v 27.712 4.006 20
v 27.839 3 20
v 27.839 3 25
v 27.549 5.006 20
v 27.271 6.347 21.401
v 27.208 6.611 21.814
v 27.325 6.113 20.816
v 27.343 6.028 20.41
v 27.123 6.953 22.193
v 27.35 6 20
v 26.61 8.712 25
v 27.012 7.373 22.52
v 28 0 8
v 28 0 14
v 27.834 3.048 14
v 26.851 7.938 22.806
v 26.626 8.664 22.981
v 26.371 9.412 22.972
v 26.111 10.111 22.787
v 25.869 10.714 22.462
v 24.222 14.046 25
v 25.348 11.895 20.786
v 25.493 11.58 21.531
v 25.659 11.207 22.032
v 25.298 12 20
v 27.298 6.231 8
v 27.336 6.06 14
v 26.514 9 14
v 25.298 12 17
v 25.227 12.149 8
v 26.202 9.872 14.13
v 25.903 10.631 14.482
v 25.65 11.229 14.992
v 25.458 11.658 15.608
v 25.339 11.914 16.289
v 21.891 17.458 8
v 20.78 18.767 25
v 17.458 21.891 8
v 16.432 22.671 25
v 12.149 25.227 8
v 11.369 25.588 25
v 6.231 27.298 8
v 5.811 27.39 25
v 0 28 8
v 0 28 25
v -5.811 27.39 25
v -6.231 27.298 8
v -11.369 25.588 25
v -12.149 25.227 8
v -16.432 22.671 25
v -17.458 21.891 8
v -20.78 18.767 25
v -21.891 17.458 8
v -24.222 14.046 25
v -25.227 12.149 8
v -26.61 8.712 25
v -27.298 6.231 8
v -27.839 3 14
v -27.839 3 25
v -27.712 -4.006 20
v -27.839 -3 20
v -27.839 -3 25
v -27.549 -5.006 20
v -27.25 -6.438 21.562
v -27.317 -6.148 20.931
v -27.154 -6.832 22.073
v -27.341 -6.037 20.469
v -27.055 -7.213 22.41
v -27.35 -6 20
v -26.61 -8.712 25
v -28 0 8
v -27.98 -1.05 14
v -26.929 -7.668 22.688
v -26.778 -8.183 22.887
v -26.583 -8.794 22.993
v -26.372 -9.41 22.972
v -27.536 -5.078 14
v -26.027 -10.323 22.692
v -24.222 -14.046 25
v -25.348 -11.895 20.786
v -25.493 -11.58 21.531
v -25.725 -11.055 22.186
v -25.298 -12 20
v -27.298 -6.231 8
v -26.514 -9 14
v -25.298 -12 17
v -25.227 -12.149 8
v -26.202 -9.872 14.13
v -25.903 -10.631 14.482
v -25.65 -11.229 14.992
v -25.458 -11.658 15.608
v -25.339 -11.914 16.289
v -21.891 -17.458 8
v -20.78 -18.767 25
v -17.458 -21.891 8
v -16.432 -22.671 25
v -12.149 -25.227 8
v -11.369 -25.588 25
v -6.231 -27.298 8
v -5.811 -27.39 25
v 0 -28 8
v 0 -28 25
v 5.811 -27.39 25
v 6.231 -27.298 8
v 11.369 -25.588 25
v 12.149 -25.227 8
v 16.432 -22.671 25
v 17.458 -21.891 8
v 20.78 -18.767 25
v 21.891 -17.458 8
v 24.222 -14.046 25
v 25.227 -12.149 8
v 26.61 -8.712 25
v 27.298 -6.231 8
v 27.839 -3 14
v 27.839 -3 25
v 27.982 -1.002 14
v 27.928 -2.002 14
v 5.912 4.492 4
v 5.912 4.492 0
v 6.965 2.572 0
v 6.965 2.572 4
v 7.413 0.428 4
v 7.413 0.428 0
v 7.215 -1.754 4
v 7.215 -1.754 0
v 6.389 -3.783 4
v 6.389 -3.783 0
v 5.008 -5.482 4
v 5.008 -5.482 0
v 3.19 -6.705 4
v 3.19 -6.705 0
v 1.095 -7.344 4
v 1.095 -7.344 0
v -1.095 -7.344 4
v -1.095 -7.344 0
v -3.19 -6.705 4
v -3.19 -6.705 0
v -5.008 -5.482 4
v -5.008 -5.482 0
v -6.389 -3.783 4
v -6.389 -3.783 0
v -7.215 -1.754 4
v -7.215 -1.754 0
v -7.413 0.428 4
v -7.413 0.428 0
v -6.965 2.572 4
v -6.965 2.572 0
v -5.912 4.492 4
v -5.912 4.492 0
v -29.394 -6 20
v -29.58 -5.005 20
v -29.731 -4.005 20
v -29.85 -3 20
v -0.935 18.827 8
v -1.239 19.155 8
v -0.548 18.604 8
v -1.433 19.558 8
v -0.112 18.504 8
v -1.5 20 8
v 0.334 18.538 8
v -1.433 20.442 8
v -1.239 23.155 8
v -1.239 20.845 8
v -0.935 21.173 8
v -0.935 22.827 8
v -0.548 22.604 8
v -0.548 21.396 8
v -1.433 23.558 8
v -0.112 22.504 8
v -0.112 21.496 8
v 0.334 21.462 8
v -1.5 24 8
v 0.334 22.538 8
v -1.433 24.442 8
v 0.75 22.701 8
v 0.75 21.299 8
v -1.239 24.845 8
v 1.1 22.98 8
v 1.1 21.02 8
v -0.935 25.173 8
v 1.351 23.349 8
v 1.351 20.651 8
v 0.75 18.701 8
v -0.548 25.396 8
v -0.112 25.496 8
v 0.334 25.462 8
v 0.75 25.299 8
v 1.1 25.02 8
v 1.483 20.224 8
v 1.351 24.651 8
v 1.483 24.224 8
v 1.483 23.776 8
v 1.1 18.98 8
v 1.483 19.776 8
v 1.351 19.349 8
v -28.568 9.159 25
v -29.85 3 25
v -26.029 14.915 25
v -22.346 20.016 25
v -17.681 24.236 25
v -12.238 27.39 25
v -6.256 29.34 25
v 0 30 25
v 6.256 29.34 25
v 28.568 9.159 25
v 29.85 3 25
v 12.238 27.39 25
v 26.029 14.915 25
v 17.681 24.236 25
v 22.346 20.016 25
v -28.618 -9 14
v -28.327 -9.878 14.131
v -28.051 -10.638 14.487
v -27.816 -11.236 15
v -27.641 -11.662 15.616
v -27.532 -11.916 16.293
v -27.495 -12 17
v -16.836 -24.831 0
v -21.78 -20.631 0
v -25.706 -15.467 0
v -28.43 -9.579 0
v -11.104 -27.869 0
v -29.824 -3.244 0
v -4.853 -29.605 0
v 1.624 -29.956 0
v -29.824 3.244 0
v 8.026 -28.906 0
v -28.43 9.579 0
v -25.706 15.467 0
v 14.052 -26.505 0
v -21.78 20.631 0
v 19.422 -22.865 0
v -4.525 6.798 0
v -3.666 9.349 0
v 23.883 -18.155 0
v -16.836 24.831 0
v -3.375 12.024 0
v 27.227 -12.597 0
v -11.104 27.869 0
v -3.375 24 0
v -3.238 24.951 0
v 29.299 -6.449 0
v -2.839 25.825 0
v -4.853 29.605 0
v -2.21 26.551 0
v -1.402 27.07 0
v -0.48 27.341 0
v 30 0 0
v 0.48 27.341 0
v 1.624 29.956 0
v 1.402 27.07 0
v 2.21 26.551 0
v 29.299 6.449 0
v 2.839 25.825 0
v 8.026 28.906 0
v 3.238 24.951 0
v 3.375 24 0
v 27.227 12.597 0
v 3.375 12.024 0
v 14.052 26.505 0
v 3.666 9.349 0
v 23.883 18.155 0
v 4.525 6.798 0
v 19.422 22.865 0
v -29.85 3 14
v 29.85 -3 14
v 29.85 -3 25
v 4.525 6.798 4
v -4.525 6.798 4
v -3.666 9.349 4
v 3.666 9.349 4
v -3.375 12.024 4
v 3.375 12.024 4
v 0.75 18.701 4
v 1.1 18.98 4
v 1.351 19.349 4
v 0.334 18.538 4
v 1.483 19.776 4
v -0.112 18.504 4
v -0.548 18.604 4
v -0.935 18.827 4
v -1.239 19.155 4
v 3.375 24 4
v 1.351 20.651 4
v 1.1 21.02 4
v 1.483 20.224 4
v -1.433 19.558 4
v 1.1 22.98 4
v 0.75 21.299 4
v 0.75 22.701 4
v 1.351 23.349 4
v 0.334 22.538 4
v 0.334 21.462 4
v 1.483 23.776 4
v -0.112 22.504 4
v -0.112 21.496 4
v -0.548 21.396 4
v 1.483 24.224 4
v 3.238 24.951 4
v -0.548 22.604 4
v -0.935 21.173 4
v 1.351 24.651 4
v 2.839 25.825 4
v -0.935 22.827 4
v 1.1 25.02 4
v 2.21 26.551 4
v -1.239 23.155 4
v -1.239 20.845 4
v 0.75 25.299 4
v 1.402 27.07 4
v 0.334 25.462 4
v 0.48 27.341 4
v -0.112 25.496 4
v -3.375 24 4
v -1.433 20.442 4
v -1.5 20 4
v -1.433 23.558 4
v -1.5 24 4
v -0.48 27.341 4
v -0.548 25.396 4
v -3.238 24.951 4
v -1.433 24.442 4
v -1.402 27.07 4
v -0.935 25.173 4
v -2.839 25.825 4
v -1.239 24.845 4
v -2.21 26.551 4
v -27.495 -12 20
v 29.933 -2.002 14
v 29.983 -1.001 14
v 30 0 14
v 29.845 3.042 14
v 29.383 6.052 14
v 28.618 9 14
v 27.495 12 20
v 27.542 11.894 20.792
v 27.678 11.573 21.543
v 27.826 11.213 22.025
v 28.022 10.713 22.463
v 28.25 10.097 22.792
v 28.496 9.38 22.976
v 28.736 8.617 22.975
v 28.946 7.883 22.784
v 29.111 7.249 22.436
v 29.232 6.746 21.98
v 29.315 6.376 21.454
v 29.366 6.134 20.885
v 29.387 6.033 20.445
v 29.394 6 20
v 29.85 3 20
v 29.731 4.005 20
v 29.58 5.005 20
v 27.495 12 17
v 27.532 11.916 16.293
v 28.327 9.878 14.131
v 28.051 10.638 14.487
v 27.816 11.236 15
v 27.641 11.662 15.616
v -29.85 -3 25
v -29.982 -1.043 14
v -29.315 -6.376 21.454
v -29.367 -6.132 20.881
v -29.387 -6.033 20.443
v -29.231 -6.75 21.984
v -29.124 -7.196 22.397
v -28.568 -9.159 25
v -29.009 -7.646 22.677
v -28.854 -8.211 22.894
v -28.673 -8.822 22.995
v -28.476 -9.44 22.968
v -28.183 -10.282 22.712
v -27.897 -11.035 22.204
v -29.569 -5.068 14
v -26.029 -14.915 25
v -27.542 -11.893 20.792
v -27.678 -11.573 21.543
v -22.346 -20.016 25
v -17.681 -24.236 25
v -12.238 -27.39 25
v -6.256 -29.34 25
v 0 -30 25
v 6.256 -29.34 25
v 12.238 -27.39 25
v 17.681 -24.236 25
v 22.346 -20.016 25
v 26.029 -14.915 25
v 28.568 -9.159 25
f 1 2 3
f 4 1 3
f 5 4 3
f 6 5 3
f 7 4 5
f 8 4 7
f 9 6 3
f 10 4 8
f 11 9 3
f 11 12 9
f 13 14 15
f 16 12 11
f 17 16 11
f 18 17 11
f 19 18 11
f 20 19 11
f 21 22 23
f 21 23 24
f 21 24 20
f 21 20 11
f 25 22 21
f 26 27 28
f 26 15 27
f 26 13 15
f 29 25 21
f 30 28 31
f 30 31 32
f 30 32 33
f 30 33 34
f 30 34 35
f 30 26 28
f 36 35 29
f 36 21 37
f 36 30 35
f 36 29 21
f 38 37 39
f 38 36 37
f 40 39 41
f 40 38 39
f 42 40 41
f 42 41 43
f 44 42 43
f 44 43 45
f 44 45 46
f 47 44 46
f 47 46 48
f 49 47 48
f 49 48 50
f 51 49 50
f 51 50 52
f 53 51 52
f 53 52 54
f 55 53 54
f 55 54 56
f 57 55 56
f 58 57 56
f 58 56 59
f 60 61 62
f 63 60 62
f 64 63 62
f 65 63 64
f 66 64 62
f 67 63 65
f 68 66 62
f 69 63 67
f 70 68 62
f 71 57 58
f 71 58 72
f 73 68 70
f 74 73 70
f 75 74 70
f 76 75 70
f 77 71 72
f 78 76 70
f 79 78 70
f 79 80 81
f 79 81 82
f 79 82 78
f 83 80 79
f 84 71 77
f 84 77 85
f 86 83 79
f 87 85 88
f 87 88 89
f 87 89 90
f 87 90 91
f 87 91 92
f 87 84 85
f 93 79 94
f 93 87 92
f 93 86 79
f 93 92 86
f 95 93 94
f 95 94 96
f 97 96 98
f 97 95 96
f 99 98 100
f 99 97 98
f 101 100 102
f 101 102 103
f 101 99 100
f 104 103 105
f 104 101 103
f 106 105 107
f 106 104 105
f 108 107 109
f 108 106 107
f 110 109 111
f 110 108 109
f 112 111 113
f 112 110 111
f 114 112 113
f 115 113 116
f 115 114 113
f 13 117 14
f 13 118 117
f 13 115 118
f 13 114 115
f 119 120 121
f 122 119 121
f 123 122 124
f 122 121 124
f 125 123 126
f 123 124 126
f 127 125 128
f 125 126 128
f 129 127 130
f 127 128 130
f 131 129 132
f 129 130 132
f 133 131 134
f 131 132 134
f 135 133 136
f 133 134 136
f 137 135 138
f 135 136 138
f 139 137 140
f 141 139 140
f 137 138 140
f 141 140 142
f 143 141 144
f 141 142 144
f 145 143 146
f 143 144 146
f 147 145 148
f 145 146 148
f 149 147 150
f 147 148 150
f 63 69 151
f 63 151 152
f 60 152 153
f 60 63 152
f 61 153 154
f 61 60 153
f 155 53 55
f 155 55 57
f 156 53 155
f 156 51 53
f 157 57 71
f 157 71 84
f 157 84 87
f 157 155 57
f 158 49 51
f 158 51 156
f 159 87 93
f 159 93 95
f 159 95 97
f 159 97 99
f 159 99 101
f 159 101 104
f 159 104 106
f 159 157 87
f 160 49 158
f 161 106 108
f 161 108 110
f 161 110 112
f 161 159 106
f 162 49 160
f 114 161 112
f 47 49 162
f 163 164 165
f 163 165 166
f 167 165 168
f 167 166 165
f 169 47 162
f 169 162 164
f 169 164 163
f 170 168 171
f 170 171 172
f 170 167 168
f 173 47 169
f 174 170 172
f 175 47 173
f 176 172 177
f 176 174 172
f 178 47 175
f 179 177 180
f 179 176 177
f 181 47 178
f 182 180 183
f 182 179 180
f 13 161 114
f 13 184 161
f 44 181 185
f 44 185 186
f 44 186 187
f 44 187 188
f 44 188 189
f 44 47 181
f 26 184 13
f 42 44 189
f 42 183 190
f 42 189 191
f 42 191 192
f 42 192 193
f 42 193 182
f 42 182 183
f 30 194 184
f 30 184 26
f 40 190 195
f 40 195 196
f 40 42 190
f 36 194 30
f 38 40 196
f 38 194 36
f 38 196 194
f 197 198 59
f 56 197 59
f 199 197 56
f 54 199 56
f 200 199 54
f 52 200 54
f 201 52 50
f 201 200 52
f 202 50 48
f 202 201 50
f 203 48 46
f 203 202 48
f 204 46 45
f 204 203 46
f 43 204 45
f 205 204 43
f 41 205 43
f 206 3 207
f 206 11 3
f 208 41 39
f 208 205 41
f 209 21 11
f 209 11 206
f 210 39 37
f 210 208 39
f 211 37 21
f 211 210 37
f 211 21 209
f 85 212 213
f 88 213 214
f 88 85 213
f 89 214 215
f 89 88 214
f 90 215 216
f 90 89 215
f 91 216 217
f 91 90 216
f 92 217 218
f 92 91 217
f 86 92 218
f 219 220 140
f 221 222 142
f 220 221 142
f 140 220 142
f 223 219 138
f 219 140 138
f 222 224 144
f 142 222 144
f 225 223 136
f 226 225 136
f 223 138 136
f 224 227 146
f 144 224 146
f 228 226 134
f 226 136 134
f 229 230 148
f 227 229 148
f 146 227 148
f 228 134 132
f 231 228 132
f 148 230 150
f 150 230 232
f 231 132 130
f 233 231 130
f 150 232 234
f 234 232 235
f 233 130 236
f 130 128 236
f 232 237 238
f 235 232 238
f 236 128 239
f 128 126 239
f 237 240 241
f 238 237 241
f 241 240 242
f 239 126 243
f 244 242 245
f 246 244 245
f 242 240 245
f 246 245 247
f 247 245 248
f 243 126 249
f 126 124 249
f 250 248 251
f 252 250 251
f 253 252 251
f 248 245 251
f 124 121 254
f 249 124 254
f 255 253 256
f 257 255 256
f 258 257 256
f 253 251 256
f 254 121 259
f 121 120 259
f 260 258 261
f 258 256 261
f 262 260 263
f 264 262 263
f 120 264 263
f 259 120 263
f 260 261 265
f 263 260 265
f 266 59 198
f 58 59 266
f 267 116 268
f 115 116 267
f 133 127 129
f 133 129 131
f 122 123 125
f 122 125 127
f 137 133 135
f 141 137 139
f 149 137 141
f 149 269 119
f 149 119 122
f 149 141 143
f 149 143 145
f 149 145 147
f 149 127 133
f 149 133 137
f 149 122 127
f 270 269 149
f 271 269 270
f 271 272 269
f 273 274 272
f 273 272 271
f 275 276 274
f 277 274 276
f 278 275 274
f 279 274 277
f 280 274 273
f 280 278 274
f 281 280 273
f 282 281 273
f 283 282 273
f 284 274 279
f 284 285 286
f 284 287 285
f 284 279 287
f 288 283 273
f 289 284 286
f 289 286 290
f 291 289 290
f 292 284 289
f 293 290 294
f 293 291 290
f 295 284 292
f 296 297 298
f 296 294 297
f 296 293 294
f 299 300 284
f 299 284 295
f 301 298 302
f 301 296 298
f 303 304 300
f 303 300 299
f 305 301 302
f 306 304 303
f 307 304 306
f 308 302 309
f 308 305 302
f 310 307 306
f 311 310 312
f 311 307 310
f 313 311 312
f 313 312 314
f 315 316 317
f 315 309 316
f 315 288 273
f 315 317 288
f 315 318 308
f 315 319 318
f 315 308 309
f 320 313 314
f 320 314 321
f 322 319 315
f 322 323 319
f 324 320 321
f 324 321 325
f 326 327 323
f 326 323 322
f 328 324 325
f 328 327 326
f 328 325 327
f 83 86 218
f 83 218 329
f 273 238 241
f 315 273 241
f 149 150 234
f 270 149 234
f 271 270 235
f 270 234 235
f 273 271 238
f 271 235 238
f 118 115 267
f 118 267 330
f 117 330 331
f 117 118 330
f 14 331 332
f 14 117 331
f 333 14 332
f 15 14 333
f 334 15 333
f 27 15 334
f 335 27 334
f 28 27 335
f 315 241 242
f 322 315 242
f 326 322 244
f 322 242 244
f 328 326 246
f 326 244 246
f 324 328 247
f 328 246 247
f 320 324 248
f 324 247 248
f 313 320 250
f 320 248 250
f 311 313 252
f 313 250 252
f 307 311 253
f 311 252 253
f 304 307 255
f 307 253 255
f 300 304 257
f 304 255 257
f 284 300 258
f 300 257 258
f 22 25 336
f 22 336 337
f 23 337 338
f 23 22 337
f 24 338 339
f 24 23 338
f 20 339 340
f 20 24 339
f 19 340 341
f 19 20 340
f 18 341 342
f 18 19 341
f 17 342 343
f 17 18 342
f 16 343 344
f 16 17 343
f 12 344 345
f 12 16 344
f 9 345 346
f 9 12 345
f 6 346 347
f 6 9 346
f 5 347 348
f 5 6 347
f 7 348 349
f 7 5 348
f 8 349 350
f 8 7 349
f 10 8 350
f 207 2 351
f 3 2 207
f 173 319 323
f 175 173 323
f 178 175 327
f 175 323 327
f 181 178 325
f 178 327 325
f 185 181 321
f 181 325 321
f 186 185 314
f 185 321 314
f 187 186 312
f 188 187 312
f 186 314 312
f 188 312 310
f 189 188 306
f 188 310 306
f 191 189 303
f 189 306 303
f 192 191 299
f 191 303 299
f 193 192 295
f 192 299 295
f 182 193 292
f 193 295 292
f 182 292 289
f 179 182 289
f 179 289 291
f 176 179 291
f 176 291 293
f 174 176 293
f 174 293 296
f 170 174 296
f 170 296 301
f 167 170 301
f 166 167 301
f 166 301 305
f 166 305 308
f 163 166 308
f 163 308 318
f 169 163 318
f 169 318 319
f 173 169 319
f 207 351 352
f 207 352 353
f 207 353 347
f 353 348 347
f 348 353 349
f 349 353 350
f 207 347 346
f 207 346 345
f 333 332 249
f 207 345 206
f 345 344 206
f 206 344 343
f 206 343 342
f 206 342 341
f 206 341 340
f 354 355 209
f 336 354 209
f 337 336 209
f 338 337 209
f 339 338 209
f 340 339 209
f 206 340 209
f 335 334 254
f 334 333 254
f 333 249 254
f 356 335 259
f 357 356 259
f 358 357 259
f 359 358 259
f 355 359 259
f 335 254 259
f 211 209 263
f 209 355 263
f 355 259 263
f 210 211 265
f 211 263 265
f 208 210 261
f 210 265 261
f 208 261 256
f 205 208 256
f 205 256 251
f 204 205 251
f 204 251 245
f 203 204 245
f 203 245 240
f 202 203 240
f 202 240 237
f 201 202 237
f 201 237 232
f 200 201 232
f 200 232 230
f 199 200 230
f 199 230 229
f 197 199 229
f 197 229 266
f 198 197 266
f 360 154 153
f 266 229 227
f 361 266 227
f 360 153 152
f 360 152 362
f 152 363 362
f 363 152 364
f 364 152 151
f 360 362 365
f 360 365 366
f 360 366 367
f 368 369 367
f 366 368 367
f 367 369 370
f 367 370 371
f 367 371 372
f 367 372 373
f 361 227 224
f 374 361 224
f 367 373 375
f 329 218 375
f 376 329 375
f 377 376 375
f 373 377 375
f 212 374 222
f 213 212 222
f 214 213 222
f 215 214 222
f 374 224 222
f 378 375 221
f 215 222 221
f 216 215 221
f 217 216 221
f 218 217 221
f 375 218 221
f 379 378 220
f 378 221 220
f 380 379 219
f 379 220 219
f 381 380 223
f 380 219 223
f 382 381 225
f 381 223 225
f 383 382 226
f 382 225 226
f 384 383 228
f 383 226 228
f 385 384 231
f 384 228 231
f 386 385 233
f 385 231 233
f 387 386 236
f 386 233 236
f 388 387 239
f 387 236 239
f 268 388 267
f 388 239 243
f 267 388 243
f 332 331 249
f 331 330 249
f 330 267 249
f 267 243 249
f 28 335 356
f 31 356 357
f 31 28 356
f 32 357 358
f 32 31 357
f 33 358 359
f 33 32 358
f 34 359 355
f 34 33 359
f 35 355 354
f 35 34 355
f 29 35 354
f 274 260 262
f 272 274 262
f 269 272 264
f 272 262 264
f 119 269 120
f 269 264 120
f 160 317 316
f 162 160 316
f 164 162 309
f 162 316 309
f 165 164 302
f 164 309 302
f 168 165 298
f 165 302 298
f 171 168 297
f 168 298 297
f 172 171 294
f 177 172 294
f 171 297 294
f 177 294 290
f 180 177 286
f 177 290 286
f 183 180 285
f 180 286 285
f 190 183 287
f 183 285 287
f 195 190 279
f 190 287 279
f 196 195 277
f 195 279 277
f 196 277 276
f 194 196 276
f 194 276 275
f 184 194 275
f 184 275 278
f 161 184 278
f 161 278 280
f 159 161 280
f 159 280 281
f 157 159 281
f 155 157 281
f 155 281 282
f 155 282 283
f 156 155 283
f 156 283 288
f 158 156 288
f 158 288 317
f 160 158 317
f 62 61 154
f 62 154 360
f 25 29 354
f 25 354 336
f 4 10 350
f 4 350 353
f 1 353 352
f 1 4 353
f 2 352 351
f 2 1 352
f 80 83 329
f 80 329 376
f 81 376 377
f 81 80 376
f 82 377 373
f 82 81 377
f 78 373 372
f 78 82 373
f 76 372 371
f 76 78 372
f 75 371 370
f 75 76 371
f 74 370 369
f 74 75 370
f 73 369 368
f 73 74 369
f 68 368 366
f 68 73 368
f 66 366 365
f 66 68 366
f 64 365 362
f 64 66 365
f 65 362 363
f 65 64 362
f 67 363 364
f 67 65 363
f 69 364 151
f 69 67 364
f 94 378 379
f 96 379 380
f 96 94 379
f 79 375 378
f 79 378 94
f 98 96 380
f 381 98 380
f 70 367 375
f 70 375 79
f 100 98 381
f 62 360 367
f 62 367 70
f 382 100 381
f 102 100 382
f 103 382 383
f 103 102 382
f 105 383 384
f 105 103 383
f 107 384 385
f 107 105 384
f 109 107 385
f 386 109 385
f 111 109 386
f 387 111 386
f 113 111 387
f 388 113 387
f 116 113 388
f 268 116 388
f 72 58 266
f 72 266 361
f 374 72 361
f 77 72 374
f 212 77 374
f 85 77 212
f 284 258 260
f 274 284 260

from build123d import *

# Parameters (mm, degrees)
SKETCH1_R           = 30
BOSS_EXTRUDE1_DEPTH = 8
SKETCH2_R           = 30
SKETCH2_R_2         = 28
BOSS_EXTRUDE2_DEPTH = 17
CUT_EXTRUDE1_DEPTH  = 39
CIRPATTERN1_COUNT   = 2
CIRPATTERN1_ANGLE   = 180
CUT_EXTRUDE2_DEPTH  = 4
SKETCH4_4_R         = 1.5
CUT_EXTRUDE3_DEPTH  = 20


with BuildPart() as part:
    # Sketch1 → Boss-Extrude1 (new body)
    with BuildSketch(Plane.XY):
        Circle(SKETCH1_R)
    extrude(amount=BOSS_EXTRUDE1_DEPTH)

    # Sketch2 → Boss-Extrude2 (add)
    with BuildSketch(Plane.XY.offset(8)):
        Circle(SKETCH2_R)
        Circle(SKETCH2_R_2, mode=Mode.SUBTRACT)
    extrude(amount=BOSS_EXTRUDE2_DEPTH)

    # Sketch3 → Cut-Extrude1 (cut)
    with BuildSketch(Plane(origin=(0, 0, 0), x_dir=(0, 0, -1), z_dir=(1, 0, 0))):
        with BuildLine():
            Line((-25, 3), (-20, 3))
            Line((-20, 3), (-14, 3))
            Line((-14, 3), (-14, -9))
            ThreePointArc((-14, -9), (-14.878679656, -11.121320344), (-17, -12))
            Line((-17, -12), (-20, -12))
            ThreePointArc((-20, -12), (-23, -9), (-20, -6))
            Line((-20, -6), (-20, -3))
            Line((-20, -3), (-25, -3))
            Line((-25, -3), (-25, 3))
        make_face()
    cut_extrude1 = extrude(amount=-CUT_EXTRUDE1_DEPTH, mode=Mode.SUBTRACT)

    # CirPattern1: Cut-Extrude1 ×2 about axis
    cirpattern1_axis = Axis((0, 0, 8), (0, 0, 1))
    for i in range(1, CIRPATTERN1_COUNT):
        add(cut_extrude1.rotate(cirpattern1_axis, i * CIRPATTERN1_ANGLE / (CIRPATTERN1_COUNT - 1)), mode=Mode.SUBTRACT)

    # Sketch4 → Cut-Extrude2 (cut)
    with BuildSketch(Plane(origin=(0, 0, 0), x_dir=(-1, 0, 0), z_dir=(0, 0, -1))):
        with BuildLine():
            Line((-3.375, 24), (-3.375, 12.024350294))
            ThreePointArc((-3.375, 12.024350294), (-4.02628005, 8.050346325), (-5.911981132, 4.49211577))
            ThreePointArc((-5.911981132, 4.49211577), (0, -7.425), (5.911981132, 4.49211577))
            ThreePointArc((5.911981132, 4.49211577), (4.02628005, 8.050346325), (3.375, 12.024350294))
            Line((3.375, 12.024350294), (3.375, 24))
            ThreePointArc((3.375, 24), (0, 27.375), (-3.375, 24))
        make_face()
    extrude(amount=-CUT_EXTRUDE2_DEPTH, mode=Mode.SUBTRACT)

    # Sketch4<4> → Cut-Extrude3 (cut)
    with BuildSketch(Plane(origin=(0, 0, 0), x_dir=(-1, 0, 0), z_dir=(0, 0, -1))):
        with Locations((0, 24)):
            Circle(SKETCH4_4_R)
        with Locations((0, 20)):
            Circle(SKETCH4_4_R)
    extrude(amount=-CUT_EXTRUDE3_DEPTH, mode=Mode.SUBTRACT)


solid = part.part
